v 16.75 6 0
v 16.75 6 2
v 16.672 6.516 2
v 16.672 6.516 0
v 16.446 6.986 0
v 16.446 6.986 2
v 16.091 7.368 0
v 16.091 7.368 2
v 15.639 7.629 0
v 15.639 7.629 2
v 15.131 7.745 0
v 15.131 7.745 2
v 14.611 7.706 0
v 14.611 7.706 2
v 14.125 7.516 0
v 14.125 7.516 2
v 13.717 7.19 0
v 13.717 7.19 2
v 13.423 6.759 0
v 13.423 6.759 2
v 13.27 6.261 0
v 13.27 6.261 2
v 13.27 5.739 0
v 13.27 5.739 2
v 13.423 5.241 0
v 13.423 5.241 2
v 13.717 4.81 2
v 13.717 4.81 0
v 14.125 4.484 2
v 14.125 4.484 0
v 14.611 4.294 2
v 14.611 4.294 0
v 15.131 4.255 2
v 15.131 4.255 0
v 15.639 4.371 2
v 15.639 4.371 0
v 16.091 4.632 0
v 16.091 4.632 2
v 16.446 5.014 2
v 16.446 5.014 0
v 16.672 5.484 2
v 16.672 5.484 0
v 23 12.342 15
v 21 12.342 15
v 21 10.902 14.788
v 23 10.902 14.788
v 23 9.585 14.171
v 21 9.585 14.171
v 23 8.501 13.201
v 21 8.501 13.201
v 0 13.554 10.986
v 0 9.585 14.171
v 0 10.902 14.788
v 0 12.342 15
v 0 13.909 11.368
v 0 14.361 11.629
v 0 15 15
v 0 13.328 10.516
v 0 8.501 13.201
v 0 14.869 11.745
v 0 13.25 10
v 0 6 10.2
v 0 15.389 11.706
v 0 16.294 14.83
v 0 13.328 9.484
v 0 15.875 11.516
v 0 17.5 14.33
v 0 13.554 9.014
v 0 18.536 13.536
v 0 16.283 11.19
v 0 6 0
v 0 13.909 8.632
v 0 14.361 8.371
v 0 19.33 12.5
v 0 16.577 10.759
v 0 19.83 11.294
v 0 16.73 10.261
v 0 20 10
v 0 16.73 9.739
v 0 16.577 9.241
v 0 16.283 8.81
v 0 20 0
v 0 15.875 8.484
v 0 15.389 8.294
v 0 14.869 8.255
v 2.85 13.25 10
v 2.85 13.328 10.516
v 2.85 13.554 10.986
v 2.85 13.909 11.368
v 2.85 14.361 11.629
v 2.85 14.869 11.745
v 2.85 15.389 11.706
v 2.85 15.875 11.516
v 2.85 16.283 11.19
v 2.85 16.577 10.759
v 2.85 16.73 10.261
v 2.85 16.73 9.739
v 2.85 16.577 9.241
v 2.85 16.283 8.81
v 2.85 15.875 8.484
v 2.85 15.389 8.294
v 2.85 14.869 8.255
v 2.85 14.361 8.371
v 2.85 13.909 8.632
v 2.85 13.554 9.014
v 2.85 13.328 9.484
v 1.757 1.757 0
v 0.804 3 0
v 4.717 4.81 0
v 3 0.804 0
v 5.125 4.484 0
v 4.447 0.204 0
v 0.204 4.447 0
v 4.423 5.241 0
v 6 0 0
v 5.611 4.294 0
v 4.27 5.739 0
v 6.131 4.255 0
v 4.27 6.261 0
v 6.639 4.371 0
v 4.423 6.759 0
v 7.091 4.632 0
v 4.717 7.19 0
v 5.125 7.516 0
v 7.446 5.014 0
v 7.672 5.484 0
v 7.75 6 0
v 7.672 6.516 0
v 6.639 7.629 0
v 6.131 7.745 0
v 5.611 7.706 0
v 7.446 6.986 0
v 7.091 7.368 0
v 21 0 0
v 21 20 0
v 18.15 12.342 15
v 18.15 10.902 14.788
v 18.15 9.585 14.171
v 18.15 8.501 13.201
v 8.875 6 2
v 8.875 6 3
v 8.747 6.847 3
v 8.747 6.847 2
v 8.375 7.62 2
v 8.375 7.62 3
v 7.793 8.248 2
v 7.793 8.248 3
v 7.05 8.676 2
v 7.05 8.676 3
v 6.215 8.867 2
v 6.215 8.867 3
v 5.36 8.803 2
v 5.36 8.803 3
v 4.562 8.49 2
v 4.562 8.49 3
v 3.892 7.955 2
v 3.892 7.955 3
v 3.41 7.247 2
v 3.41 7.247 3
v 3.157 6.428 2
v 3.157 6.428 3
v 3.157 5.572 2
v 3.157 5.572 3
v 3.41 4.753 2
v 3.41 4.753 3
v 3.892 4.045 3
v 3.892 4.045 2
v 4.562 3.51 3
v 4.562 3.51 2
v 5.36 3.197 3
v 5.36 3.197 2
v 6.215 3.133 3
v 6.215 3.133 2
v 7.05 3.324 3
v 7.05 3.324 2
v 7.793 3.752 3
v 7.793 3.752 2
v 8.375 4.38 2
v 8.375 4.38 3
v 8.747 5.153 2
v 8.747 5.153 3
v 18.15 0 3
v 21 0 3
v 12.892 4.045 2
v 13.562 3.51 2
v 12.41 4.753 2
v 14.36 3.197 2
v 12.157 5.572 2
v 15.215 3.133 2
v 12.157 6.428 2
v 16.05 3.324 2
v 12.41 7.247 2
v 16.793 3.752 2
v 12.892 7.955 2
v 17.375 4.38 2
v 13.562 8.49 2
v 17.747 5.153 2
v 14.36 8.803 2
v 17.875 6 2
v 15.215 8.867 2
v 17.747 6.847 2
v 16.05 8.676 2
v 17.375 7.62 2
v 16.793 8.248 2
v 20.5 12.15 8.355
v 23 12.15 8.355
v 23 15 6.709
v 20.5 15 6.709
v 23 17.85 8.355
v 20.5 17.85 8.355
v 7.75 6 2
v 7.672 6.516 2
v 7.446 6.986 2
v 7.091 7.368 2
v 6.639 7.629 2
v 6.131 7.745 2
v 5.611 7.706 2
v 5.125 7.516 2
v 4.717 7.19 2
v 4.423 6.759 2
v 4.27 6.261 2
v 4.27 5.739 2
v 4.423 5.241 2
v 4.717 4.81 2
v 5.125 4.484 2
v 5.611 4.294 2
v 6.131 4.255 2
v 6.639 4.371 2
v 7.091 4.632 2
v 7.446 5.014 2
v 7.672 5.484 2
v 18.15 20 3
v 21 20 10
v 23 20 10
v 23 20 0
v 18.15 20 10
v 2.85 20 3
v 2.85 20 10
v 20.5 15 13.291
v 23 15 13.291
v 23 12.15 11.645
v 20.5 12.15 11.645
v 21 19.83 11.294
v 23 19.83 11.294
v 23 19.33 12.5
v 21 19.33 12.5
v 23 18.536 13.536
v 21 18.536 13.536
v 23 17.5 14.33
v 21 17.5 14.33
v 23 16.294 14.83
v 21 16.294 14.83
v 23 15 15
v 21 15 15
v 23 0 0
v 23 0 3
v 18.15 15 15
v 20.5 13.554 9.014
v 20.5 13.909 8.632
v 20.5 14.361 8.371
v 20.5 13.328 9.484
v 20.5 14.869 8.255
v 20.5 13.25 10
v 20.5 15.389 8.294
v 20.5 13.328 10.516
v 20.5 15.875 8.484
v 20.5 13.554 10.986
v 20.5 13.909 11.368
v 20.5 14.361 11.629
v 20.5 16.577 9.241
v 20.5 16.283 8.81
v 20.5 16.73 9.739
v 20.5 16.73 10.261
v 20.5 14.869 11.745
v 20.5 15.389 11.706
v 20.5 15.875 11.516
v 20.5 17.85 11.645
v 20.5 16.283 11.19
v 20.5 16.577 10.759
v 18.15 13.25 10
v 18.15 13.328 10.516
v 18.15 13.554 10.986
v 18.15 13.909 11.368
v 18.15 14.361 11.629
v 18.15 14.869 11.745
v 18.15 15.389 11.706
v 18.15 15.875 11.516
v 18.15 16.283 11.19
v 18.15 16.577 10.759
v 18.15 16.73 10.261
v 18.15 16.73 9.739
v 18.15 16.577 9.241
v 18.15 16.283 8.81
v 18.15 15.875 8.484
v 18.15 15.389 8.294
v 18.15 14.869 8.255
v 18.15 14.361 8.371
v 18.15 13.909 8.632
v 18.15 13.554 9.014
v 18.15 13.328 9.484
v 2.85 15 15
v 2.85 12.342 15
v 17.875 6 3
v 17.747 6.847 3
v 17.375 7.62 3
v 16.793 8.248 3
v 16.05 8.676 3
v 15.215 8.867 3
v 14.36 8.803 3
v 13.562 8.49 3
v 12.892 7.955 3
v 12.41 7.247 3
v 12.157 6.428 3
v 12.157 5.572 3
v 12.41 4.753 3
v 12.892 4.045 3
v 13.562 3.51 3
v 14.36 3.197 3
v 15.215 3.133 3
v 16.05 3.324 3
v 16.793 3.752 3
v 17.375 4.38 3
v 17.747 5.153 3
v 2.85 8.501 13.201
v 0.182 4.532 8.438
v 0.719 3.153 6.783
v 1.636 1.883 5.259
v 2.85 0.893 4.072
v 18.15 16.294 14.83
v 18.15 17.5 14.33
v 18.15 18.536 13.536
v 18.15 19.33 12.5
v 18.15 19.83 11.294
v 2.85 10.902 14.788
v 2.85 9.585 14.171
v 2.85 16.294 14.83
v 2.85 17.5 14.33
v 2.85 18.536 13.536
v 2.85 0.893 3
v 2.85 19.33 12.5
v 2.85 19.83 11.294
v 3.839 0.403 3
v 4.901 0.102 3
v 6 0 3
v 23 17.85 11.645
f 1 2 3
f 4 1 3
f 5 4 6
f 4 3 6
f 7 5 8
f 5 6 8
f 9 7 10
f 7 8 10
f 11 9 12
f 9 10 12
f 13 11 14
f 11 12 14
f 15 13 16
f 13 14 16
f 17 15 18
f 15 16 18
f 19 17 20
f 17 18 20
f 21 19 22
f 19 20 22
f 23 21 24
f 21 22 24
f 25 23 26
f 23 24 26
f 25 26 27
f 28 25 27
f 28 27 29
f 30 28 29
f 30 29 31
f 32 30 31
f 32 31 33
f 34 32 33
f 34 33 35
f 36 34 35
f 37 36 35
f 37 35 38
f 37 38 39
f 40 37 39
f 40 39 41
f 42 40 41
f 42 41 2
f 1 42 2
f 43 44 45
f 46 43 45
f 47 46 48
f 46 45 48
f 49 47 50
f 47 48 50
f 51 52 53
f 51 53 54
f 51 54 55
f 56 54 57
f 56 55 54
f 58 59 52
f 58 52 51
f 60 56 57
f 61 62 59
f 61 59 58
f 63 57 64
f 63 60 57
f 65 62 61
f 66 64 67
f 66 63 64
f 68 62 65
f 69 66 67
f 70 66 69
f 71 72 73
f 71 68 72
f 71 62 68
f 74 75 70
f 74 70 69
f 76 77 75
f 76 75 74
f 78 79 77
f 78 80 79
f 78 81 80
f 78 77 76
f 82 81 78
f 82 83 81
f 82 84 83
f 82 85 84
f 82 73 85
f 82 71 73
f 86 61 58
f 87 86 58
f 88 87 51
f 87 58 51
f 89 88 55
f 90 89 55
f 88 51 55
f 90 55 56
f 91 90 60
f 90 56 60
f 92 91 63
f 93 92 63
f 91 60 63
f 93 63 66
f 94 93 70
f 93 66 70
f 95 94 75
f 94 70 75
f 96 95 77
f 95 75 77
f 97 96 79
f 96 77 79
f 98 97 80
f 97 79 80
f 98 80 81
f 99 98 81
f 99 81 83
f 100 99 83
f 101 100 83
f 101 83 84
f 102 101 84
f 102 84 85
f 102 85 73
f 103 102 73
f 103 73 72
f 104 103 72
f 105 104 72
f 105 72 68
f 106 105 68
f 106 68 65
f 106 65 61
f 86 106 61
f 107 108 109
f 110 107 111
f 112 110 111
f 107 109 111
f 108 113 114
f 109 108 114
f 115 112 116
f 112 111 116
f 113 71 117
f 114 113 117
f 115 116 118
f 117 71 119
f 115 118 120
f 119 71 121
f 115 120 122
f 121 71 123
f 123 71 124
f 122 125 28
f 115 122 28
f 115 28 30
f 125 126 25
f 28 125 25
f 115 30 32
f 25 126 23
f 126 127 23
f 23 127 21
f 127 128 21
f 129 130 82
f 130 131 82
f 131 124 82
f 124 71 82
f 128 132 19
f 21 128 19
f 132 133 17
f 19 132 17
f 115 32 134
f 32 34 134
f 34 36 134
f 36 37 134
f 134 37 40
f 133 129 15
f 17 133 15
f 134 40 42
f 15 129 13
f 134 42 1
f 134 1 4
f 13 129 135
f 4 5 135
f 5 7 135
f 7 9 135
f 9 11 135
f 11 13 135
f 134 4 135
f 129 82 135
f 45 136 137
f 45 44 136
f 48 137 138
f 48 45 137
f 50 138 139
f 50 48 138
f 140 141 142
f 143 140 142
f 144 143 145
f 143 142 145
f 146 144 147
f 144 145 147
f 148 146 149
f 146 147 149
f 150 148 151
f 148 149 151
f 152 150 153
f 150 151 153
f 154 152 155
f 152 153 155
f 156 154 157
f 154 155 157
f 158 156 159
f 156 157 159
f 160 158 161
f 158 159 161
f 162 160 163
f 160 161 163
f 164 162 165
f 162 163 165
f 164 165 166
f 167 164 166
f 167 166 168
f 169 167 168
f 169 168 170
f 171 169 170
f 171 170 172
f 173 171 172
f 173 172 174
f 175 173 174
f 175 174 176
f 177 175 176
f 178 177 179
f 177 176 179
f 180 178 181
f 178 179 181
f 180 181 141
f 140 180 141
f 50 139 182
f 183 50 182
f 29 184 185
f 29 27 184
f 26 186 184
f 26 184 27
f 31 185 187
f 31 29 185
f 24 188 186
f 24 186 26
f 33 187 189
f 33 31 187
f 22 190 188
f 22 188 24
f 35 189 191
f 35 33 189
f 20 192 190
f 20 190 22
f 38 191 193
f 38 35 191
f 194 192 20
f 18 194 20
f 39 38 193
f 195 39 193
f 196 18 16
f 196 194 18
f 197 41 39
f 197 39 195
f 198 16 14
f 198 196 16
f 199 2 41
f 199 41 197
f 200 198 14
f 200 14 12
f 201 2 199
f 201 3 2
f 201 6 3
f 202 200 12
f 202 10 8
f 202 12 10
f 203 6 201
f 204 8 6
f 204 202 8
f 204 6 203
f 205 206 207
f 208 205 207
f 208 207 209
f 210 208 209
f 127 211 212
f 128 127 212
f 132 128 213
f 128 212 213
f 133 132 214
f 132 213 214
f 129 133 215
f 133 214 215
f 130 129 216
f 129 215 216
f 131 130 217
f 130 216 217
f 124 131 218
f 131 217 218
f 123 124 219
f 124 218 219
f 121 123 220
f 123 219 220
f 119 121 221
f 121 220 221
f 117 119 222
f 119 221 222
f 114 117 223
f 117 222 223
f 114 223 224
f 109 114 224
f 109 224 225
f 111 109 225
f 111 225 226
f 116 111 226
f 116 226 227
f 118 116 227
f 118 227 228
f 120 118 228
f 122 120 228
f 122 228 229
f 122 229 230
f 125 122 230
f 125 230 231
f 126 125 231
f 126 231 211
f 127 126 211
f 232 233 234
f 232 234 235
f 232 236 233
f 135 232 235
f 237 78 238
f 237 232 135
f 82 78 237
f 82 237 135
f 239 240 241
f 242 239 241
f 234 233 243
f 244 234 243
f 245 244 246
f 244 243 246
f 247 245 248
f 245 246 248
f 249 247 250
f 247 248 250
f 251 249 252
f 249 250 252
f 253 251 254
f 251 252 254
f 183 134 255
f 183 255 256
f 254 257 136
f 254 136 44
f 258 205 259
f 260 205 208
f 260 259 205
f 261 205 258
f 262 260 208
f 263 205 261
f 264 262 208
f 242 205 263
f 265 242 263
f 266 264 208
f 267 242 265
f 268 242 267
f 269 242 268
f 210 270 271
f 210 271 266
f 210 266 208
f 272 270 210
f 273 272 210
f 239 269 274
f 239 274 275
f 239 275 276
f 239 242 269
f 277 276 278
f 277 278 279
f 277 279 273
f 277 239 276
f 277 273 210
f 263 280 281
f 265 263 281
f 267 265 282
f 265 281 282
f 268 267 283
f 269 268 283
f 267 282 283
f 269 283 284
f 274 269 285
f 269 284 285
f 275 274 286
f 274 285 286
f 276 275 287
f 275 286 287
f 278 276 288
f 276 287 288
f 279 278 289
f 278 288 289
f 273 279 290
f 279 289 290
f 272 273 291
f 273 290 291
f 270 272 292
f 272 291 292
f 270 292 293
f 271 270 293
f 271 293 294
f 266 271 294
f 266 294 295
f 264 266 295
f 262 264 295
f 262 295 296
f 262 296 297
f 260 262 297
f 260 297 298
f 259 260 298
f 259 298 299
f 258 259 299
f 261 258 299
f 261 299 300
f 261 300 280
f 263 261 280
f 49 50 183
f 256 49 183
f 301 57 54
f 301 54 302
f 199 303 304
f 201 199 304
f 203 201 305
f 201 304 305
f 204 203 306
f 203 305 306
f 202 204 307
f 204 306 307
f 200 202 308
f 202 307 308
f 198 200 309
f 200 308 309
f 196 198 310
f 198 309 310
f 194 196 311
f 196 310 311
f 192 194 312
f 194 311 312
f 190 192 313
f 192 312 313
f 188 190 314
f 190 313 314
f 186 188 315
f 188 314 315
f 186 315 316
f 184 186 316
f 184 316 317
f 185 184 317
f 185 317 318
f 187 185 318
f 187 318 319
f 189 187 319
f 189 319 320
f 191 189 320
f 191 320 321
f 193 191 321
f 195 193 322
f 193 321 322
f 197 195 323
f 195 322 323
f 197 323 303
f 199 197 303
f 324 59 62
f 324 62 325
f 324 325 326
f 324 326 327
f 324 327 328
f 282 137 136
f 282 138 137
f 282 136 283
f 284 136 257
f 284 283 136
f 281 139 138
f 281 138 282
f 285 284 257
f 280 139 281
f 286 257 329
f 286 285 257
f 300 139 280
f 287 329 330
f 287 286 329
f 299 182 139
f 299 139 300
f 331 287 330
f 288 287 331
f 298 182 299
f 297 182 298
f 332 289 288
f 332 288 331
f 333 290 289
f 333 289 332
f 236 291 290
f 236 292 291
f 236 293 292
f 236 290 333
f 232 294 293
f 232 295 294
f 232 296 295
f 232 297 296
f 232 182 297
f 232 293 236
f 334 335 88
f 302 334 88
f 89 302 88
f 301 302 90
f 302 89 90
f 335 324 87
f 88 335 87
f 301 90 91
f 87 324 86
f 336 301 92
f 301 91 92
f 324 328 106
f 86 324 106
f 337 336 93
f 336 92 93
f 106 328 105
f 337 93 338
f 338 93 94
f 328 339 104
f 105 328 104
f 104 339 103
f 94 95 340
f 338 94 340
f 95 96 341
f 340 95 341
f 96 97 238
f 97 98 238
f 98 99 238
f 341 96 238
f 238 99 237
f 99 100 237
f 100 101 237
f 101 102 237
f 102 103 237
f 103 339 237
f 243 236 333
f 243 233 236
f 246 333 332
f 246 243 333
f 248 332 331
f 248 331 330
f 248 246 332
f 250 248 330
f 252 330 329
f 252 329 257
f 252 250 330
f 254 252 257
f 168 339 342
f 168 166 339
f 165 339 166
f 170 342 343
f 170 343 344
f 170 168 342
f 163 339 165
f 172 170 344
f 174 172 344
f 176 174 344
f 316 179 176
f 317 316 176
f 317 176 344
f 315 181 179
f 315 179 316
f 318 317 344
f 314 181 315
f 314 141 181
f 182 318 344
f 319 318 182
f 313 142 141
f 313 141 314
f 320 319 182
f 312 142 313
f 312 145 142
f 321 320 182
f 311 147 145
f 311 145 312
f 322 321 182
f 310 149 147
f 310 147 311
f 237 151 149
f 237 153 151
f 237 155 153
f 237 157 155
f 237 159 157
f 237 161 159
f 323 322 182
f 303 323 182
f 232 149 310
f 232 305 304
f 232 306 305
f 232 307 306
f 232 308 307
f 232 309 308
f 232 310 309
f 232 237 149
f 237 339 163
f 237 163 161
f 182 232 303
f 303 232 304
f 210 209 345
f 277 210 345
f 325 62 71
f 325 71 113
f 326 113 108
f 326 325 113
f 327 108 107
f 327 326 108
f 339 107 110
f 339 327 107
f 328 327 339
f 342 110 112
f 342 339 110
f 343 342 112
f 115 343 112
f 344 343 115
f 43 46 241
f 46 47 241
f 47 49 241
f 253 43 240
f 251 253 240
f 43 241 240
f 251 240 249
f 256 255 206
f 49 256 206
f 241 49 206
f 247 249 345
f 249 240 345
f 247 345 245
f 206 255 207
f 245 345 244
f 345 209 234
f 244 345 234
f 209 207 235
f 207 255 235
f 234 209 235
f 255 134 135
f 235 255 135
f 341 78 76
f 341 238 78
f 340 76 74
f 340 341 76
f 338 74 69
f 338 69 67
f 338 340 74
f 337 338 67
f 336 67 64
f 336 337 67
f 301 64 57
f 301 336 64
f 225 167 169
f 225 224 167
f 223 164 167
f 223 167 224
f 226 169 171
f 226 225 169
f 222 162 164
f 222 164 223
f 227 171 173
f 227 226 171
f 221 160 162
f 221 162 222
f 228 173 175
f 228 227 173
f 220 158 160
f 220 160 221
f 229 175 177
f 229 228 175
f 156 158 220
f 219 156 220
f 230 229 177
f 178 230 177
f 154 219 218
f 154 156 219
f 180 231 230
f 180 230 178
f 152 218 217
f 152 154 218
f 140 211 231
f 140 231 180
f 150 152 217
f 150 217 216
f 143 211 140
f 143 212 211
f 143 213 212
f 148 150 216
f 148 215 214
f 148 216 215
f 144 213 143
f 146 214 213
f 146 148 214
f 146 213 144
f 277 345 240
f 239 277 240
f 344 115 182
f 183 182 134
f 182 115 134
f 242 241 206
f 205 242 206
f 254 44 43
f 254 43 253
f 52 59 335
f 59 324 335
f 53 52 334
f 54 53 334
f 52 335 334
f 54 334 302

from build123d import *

# Parameters (mm, degrees)
F0_W      = 21
F0_H      = 20
F1_DEPTH  = 3
F2_W      = 2.85
F2_H      = 20
F3_DEPTH  = 12
F4_R      = 6
F5_R      = 1.75
F6_DEPTH  = 21.001
F7_R      = 5
F8_R      = 1.75
F9_DEPTH  = 3.001
F10_DEPTH = 2
F12_DEPTH = 2.5
F13_R     = 2.875
F14_DEPTH = 1


with BuildPart() as f1:
    # F0 (on Top) → F1 (new body)
    with BuildSketch(Plane.XY):
        with Locations((10.5, 10)):
            Rectangle(F0_W, F0_H)
    extrude(amount=F1_DEPTH)

    # F2 (on face) → F3 (join)
    with BuildSketch(Plane.XY.offset(3)):
        with Locations((1.425, 10)):
            Rectangle(F2_W, F2_H)
        with Locations((19.575, 10)):
            Rectangle(F2_W, F2_H)
    extrude(amount=F3_DEPTH)

    # F4
    f4_edges = [f1.edges().sort_by_distance(p)[0] for p in [
        (0, 0, 7.5),
    ]]
    fillet(f4_edges, radius=F4_R)

    # F5 (on face) → F6 (cut, through all)
    with BuildSketch(Plane(origin=(0, 0, 0), x_dir=(0, -1, 0), z_dir=(-1, 0, 0))):
        with Locations((-15, 10)):
            Circle(F5_R)
        Polygon((0, 15), (-10, 15), (0, 3), align=None)
    extrude(amount=-F6_DEPTH, mode=Mode.SUBTRACT)

    # F7
    f7_edges = [f1.edges().sort_by_distance(p)[0] for p in [
        (1.425, 20, 15),
        (19.575, 20, 15),
        (1.425, 10, 15),
        (19.575, 10, 15),
    ]]
    fillet(f7_edges, radius=F7_R)

    # F8 (on face) → F9 (cut, through all)
    with BuildSketch(Plane.XY.offset(3)):
        with Locations((6, 6)):
            Circle(F8_R)
        with Locations((15, 6)):
            Circle(F8_R)
    extrude(amount=-F9_DEPTH, mode=Mode.SUBTRACT)

    # F10 (add): a face of the model
    f10_faces = [f1.faces().sort_by_distance(p)[0] for p in [
        (21, 11.3560605972, 6.2794868265),
    ]]
    extrude(f10_faces, amount=F10_DEPTH)

    # F11 (on face) → F12 (cut)
    with BuildSketch(Plane.YZ.offset(23)):
        Polygon((17.85, 8.3545517328), (17.85, 11.6454482672), (15, 13.2908965344), (12.15, 11.6454482672), (12.15, 8.3545517328), (15, 6.7091034656), align=None)
    extrude(amount=-F12_DEPTH, mode=Mode.SUBTRACT)

    # F13 (on face) → F14 (cut)
    with BuildSketch(Plane.XY.offset(3)):
        with Locations((6, 6)):
            Circle(F13_R)
        with Locations((15, 6)):
            Circle(F13_R)
    extrude(amount=-F14_DEPTH, mode=Mode.SUBTRACT)


solid = f1.part
